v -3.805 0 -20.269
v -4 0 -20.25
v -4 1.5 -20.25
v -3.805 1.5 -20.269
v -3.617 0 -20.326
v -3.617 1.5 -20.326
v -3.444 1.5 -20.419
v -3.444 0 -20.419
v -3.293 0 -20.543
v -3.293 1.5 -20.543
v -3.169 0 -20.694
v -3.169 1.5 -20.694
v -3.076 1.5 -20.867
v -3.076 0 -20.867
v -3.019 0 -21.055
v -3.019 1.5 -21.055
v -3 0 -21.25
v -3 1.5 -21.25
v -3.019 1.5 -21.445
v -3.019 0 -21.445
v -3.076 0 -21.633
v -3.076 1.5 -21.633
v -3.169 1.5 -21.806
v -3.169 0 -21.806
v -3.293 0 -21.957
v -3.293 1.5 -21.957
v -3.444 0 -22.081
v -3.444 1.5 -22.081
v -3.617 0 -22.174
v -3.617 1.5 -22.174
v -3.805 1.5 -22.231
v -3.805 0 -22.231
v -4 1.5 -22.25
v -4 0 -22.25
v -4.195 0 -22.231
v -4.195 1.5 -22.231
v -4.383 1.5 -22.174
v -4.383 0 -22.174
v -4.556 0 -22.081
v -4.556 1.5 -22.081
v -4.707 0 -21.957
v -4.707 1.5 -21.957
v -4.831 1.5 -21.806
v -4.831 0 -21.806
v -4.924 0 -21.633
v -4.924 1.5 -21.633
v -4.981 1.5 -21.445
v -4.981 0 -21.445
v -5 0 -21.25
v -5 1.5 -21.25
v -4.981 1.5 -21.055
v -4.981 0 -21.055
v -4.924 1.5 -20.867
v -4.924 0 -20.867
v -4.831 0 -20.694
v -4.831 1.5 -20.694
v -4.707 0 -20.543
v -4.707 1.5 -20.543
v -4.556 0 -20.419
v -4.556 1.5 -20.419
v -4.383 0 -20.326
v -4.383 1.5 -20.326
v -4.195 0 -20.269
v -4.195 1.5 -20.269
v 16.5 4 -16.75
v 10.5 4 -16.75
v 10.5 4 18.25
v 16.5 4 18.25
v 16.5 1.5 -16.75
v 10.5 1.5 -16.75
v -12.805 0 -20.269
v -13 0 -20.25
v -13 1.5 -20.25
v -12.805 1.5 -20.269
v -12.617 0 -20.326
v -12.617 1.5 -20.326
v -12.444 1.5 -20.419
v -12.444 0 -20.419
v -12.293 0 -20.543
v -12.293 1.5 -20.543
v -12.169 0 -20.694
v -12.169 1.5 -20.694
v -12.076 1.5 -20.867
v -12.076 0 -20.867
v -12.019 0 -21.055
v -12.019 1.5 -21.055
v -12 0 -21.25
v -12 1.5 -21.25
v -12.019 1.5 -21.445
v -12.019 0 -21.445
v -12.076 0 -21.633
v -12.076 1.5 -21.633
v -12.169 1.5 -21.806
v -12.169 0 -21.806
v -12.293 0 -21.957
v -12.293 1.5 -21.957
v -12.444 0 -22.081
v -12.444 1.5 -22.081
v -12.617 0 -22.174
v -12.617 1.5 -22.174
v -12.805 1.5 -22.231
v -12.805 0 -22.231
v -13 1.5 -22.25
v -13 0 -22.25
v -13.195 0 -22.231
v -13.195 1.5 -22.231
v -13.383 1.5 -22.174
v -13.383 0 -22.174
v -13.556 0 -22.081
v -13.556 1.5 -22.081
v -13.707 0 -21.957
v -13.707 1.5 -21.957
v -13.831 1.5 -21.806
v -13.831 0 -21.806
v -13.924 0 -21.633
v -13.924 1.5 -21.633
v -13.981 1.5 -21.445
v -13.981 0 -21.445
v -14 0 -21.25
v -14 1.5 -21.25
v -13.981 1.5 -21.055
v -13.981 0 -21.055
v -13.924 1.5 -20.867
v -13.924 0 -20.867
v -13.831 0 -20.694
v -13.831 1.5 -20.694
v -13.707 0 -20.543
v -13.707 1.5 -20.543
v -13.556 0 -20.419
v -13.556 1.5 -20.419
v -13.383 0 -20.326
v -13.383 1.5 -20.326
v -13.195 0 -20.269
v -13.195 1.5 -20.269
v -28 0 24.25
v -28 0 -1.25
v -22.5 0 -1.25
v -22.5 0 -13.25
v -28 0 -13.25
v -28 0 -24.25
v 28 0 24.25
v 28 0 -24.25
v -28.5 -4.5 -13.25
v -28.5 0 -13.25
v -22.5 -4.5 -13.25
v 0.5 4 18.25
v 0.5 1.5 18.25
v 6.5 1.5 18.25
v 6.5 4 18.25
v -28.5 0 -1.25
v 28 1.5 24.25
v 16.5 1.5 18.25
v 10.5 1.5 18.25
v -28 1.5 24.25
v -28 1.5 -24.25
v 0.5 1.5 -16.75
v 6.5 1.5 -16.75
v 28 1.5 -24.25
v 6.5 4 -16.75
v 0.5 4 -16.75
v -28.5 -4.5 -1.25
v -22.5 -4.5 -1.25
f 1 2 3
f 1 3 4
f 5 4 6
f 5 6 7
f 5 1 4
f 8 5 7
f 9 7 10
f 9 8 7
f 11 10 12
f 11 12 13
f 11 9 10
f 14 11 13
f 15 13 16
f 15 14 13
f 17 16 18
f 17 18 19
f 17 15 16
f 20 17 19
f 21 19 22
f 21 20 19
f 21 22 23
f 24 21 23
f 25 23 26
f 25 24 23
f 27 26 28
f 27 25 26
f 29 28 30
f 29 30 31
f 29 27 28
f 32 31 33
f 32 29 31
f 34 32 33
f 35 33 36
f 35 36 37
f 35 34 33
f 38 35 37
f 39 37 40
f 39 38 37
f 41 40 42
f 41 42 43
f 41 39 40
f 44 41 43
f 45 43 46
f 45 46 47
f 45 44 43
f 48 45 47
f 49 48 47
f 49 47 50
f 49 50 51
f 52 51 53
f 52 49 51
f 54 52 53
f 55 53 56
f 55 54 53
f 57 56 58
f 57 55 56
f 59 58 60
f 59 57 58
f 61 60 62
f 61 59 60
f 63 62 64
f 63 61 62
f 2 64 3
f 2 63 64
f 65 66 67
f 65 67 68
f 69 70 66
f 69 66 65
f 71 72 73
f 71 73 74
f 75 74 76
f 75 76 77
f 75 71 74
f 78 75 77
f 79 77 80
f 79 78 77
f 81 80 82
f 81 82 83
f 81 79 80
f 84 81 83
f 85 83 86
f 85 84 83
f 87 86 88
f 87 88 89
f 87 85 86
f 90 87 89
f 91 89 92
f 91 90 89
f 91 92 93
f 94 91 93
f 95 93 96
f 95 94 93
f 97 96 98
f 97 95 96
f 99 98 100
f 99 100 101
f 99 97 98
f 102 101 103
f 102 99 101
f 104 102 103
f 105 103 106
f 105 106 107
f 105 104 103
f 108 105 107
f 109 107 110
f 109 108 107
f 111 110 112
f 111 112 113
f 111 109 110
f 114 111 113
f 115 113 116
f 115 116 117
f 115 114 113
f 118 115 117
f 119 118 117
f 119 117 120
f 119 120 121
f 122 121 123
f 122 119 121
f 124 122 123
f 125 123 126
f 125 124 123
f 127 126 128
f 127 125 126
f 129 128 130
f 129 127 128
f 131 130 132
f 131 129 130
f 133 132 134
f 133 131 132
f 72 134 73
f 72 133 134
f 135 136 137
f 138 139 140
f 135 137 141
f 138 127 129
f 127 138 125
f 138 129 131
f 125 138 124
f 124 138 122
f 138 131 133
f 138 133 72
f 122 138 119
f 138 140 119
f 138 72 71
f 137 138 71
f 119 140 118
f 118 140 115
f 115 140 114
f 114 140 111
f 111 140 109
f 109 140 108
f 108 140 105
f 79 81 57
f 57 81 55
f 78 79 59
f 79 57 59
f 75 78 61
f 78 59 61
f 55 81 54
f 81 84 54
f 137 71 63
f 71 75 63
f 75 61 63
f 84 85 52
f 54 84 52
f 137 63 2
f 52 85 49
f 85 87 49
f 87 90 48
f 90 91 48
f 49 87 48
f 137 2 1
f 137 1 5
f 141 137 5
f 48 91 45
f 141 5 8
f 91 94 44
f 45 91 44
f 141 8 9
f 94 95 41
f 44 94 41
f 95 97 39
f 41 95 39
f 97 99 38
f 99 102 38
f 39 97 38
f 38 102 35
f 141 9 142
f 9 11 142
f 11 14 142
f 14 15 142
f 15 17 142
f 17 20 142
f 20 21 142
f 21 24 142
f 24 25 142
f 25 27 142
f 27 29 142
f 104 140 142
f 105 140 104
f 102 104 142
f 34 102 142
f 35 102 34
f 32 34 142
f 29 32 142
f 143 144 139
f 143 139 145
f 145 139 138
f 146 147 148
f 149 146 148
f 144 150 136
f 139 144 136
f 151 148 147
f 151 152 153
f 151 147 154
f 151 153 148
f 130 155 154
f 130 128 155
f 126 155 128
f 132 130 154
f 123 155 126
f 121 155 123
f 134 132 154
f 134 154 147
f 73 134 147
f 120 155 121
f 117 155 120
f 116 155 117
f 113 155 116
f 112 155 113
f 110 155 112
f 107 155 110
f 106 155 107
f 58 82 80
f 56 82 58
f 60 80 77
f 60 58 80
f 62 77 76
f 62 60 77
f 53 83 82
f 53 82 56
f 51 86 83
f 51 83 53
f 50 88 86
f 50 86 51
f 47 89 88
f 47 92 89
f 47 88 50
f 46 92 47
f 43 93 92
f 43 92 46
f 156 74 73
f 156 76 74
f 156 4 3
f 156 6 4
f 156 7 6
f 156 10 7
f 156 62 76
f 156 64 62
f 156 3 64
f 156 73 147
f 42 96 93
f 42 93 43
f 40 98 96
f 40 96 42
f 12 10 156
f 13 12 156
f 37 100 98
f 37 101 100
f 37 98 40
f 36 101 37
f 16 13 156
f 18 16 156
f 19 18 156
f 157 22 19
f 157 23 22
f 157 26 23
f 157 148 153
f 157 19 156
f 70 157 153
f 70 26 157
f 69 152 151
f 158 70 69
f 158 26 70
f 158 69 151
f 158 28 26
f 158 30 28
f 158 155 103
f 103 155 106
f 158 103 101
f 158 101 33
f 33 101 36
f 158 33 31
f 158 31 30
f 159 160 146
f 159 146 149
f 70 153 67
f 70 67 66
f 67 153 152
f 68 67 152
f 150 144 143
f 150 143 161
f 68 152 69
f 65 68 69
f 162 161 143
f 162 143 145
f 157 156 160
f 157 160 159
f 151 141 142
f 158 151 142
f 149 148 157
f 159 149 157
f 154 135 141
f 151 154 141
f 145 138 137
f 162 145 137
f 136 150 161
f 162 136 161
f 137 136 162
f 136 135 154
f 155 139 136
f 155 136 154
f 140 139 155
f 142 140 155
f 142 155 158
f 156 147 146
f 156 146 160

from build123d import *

# Parameters (mm, degrees)
SKETCH_1_W      = 56
SKETCH_1_H      = 48.5
SKETCH_1_R      = 1
EXTRUDE_1_DEPTH = 1.5
SKETCH_2_W      = 6
SKETCH_2_H      = 35
EXTRUDE_2_DEPTH = 2.5
SKETCH_3_W      = 6
SKETCH_3_H      = 12
EXTRUDE_3_DEPTH = 4.5


with BuildPart() as part:
    # Эскиз1 → Бобышка-Вытянуть1 (new body)
    with BuildSketch(Plane(origin=(0, 0, 0), x_dir=(1, 0, 0), z_dir=(0, 1, 0))):
        Rectangle(SKETCH_1_W, SKETCH_1_H)
        with Locations(Location((-13, 21.25, 0), (0, 0, 270))):
            Circle(SKETCH_1_R, mode=Mode.SUBTRACT)
        with Locations(Location((-4, 21.25, 0), (0, 0, 270))):
            Circle(SKETCH_1_R, mode=Mode.SUBTRACT)
    extrude(amount=EXTRUDE_1_DEPTH)

    # Эскиз2 → Бобышка-Вытянуть2 (add)
    with BuildSketch(Plane(origin=(0, 1.5, 0), x_dir=(1, 0, 0), z_dir=(0, 1, 0))):
        with Locations((3.5, -0.75)):
            Rectangle(SKETCH_2_W, SKETCH_2_H)
        with Locations((13.5, -0.75)):
            Rectangle(SKETCH_2_W, SKETCH_2_H)
    extrude(amount=EXTRUDE_2_DEPTH)

    # Эскиз3 → Бобышка-Вытянуть3 (add)
    with BuildSketch(Plane.XZ):
        with Locations((-25.5, -7.25)):
            Rectangle(SKETCH_3_W, SKETCH_3_H)
    extrude(amount=EXTRUDE_3_DEPTH)


solid = part.part
